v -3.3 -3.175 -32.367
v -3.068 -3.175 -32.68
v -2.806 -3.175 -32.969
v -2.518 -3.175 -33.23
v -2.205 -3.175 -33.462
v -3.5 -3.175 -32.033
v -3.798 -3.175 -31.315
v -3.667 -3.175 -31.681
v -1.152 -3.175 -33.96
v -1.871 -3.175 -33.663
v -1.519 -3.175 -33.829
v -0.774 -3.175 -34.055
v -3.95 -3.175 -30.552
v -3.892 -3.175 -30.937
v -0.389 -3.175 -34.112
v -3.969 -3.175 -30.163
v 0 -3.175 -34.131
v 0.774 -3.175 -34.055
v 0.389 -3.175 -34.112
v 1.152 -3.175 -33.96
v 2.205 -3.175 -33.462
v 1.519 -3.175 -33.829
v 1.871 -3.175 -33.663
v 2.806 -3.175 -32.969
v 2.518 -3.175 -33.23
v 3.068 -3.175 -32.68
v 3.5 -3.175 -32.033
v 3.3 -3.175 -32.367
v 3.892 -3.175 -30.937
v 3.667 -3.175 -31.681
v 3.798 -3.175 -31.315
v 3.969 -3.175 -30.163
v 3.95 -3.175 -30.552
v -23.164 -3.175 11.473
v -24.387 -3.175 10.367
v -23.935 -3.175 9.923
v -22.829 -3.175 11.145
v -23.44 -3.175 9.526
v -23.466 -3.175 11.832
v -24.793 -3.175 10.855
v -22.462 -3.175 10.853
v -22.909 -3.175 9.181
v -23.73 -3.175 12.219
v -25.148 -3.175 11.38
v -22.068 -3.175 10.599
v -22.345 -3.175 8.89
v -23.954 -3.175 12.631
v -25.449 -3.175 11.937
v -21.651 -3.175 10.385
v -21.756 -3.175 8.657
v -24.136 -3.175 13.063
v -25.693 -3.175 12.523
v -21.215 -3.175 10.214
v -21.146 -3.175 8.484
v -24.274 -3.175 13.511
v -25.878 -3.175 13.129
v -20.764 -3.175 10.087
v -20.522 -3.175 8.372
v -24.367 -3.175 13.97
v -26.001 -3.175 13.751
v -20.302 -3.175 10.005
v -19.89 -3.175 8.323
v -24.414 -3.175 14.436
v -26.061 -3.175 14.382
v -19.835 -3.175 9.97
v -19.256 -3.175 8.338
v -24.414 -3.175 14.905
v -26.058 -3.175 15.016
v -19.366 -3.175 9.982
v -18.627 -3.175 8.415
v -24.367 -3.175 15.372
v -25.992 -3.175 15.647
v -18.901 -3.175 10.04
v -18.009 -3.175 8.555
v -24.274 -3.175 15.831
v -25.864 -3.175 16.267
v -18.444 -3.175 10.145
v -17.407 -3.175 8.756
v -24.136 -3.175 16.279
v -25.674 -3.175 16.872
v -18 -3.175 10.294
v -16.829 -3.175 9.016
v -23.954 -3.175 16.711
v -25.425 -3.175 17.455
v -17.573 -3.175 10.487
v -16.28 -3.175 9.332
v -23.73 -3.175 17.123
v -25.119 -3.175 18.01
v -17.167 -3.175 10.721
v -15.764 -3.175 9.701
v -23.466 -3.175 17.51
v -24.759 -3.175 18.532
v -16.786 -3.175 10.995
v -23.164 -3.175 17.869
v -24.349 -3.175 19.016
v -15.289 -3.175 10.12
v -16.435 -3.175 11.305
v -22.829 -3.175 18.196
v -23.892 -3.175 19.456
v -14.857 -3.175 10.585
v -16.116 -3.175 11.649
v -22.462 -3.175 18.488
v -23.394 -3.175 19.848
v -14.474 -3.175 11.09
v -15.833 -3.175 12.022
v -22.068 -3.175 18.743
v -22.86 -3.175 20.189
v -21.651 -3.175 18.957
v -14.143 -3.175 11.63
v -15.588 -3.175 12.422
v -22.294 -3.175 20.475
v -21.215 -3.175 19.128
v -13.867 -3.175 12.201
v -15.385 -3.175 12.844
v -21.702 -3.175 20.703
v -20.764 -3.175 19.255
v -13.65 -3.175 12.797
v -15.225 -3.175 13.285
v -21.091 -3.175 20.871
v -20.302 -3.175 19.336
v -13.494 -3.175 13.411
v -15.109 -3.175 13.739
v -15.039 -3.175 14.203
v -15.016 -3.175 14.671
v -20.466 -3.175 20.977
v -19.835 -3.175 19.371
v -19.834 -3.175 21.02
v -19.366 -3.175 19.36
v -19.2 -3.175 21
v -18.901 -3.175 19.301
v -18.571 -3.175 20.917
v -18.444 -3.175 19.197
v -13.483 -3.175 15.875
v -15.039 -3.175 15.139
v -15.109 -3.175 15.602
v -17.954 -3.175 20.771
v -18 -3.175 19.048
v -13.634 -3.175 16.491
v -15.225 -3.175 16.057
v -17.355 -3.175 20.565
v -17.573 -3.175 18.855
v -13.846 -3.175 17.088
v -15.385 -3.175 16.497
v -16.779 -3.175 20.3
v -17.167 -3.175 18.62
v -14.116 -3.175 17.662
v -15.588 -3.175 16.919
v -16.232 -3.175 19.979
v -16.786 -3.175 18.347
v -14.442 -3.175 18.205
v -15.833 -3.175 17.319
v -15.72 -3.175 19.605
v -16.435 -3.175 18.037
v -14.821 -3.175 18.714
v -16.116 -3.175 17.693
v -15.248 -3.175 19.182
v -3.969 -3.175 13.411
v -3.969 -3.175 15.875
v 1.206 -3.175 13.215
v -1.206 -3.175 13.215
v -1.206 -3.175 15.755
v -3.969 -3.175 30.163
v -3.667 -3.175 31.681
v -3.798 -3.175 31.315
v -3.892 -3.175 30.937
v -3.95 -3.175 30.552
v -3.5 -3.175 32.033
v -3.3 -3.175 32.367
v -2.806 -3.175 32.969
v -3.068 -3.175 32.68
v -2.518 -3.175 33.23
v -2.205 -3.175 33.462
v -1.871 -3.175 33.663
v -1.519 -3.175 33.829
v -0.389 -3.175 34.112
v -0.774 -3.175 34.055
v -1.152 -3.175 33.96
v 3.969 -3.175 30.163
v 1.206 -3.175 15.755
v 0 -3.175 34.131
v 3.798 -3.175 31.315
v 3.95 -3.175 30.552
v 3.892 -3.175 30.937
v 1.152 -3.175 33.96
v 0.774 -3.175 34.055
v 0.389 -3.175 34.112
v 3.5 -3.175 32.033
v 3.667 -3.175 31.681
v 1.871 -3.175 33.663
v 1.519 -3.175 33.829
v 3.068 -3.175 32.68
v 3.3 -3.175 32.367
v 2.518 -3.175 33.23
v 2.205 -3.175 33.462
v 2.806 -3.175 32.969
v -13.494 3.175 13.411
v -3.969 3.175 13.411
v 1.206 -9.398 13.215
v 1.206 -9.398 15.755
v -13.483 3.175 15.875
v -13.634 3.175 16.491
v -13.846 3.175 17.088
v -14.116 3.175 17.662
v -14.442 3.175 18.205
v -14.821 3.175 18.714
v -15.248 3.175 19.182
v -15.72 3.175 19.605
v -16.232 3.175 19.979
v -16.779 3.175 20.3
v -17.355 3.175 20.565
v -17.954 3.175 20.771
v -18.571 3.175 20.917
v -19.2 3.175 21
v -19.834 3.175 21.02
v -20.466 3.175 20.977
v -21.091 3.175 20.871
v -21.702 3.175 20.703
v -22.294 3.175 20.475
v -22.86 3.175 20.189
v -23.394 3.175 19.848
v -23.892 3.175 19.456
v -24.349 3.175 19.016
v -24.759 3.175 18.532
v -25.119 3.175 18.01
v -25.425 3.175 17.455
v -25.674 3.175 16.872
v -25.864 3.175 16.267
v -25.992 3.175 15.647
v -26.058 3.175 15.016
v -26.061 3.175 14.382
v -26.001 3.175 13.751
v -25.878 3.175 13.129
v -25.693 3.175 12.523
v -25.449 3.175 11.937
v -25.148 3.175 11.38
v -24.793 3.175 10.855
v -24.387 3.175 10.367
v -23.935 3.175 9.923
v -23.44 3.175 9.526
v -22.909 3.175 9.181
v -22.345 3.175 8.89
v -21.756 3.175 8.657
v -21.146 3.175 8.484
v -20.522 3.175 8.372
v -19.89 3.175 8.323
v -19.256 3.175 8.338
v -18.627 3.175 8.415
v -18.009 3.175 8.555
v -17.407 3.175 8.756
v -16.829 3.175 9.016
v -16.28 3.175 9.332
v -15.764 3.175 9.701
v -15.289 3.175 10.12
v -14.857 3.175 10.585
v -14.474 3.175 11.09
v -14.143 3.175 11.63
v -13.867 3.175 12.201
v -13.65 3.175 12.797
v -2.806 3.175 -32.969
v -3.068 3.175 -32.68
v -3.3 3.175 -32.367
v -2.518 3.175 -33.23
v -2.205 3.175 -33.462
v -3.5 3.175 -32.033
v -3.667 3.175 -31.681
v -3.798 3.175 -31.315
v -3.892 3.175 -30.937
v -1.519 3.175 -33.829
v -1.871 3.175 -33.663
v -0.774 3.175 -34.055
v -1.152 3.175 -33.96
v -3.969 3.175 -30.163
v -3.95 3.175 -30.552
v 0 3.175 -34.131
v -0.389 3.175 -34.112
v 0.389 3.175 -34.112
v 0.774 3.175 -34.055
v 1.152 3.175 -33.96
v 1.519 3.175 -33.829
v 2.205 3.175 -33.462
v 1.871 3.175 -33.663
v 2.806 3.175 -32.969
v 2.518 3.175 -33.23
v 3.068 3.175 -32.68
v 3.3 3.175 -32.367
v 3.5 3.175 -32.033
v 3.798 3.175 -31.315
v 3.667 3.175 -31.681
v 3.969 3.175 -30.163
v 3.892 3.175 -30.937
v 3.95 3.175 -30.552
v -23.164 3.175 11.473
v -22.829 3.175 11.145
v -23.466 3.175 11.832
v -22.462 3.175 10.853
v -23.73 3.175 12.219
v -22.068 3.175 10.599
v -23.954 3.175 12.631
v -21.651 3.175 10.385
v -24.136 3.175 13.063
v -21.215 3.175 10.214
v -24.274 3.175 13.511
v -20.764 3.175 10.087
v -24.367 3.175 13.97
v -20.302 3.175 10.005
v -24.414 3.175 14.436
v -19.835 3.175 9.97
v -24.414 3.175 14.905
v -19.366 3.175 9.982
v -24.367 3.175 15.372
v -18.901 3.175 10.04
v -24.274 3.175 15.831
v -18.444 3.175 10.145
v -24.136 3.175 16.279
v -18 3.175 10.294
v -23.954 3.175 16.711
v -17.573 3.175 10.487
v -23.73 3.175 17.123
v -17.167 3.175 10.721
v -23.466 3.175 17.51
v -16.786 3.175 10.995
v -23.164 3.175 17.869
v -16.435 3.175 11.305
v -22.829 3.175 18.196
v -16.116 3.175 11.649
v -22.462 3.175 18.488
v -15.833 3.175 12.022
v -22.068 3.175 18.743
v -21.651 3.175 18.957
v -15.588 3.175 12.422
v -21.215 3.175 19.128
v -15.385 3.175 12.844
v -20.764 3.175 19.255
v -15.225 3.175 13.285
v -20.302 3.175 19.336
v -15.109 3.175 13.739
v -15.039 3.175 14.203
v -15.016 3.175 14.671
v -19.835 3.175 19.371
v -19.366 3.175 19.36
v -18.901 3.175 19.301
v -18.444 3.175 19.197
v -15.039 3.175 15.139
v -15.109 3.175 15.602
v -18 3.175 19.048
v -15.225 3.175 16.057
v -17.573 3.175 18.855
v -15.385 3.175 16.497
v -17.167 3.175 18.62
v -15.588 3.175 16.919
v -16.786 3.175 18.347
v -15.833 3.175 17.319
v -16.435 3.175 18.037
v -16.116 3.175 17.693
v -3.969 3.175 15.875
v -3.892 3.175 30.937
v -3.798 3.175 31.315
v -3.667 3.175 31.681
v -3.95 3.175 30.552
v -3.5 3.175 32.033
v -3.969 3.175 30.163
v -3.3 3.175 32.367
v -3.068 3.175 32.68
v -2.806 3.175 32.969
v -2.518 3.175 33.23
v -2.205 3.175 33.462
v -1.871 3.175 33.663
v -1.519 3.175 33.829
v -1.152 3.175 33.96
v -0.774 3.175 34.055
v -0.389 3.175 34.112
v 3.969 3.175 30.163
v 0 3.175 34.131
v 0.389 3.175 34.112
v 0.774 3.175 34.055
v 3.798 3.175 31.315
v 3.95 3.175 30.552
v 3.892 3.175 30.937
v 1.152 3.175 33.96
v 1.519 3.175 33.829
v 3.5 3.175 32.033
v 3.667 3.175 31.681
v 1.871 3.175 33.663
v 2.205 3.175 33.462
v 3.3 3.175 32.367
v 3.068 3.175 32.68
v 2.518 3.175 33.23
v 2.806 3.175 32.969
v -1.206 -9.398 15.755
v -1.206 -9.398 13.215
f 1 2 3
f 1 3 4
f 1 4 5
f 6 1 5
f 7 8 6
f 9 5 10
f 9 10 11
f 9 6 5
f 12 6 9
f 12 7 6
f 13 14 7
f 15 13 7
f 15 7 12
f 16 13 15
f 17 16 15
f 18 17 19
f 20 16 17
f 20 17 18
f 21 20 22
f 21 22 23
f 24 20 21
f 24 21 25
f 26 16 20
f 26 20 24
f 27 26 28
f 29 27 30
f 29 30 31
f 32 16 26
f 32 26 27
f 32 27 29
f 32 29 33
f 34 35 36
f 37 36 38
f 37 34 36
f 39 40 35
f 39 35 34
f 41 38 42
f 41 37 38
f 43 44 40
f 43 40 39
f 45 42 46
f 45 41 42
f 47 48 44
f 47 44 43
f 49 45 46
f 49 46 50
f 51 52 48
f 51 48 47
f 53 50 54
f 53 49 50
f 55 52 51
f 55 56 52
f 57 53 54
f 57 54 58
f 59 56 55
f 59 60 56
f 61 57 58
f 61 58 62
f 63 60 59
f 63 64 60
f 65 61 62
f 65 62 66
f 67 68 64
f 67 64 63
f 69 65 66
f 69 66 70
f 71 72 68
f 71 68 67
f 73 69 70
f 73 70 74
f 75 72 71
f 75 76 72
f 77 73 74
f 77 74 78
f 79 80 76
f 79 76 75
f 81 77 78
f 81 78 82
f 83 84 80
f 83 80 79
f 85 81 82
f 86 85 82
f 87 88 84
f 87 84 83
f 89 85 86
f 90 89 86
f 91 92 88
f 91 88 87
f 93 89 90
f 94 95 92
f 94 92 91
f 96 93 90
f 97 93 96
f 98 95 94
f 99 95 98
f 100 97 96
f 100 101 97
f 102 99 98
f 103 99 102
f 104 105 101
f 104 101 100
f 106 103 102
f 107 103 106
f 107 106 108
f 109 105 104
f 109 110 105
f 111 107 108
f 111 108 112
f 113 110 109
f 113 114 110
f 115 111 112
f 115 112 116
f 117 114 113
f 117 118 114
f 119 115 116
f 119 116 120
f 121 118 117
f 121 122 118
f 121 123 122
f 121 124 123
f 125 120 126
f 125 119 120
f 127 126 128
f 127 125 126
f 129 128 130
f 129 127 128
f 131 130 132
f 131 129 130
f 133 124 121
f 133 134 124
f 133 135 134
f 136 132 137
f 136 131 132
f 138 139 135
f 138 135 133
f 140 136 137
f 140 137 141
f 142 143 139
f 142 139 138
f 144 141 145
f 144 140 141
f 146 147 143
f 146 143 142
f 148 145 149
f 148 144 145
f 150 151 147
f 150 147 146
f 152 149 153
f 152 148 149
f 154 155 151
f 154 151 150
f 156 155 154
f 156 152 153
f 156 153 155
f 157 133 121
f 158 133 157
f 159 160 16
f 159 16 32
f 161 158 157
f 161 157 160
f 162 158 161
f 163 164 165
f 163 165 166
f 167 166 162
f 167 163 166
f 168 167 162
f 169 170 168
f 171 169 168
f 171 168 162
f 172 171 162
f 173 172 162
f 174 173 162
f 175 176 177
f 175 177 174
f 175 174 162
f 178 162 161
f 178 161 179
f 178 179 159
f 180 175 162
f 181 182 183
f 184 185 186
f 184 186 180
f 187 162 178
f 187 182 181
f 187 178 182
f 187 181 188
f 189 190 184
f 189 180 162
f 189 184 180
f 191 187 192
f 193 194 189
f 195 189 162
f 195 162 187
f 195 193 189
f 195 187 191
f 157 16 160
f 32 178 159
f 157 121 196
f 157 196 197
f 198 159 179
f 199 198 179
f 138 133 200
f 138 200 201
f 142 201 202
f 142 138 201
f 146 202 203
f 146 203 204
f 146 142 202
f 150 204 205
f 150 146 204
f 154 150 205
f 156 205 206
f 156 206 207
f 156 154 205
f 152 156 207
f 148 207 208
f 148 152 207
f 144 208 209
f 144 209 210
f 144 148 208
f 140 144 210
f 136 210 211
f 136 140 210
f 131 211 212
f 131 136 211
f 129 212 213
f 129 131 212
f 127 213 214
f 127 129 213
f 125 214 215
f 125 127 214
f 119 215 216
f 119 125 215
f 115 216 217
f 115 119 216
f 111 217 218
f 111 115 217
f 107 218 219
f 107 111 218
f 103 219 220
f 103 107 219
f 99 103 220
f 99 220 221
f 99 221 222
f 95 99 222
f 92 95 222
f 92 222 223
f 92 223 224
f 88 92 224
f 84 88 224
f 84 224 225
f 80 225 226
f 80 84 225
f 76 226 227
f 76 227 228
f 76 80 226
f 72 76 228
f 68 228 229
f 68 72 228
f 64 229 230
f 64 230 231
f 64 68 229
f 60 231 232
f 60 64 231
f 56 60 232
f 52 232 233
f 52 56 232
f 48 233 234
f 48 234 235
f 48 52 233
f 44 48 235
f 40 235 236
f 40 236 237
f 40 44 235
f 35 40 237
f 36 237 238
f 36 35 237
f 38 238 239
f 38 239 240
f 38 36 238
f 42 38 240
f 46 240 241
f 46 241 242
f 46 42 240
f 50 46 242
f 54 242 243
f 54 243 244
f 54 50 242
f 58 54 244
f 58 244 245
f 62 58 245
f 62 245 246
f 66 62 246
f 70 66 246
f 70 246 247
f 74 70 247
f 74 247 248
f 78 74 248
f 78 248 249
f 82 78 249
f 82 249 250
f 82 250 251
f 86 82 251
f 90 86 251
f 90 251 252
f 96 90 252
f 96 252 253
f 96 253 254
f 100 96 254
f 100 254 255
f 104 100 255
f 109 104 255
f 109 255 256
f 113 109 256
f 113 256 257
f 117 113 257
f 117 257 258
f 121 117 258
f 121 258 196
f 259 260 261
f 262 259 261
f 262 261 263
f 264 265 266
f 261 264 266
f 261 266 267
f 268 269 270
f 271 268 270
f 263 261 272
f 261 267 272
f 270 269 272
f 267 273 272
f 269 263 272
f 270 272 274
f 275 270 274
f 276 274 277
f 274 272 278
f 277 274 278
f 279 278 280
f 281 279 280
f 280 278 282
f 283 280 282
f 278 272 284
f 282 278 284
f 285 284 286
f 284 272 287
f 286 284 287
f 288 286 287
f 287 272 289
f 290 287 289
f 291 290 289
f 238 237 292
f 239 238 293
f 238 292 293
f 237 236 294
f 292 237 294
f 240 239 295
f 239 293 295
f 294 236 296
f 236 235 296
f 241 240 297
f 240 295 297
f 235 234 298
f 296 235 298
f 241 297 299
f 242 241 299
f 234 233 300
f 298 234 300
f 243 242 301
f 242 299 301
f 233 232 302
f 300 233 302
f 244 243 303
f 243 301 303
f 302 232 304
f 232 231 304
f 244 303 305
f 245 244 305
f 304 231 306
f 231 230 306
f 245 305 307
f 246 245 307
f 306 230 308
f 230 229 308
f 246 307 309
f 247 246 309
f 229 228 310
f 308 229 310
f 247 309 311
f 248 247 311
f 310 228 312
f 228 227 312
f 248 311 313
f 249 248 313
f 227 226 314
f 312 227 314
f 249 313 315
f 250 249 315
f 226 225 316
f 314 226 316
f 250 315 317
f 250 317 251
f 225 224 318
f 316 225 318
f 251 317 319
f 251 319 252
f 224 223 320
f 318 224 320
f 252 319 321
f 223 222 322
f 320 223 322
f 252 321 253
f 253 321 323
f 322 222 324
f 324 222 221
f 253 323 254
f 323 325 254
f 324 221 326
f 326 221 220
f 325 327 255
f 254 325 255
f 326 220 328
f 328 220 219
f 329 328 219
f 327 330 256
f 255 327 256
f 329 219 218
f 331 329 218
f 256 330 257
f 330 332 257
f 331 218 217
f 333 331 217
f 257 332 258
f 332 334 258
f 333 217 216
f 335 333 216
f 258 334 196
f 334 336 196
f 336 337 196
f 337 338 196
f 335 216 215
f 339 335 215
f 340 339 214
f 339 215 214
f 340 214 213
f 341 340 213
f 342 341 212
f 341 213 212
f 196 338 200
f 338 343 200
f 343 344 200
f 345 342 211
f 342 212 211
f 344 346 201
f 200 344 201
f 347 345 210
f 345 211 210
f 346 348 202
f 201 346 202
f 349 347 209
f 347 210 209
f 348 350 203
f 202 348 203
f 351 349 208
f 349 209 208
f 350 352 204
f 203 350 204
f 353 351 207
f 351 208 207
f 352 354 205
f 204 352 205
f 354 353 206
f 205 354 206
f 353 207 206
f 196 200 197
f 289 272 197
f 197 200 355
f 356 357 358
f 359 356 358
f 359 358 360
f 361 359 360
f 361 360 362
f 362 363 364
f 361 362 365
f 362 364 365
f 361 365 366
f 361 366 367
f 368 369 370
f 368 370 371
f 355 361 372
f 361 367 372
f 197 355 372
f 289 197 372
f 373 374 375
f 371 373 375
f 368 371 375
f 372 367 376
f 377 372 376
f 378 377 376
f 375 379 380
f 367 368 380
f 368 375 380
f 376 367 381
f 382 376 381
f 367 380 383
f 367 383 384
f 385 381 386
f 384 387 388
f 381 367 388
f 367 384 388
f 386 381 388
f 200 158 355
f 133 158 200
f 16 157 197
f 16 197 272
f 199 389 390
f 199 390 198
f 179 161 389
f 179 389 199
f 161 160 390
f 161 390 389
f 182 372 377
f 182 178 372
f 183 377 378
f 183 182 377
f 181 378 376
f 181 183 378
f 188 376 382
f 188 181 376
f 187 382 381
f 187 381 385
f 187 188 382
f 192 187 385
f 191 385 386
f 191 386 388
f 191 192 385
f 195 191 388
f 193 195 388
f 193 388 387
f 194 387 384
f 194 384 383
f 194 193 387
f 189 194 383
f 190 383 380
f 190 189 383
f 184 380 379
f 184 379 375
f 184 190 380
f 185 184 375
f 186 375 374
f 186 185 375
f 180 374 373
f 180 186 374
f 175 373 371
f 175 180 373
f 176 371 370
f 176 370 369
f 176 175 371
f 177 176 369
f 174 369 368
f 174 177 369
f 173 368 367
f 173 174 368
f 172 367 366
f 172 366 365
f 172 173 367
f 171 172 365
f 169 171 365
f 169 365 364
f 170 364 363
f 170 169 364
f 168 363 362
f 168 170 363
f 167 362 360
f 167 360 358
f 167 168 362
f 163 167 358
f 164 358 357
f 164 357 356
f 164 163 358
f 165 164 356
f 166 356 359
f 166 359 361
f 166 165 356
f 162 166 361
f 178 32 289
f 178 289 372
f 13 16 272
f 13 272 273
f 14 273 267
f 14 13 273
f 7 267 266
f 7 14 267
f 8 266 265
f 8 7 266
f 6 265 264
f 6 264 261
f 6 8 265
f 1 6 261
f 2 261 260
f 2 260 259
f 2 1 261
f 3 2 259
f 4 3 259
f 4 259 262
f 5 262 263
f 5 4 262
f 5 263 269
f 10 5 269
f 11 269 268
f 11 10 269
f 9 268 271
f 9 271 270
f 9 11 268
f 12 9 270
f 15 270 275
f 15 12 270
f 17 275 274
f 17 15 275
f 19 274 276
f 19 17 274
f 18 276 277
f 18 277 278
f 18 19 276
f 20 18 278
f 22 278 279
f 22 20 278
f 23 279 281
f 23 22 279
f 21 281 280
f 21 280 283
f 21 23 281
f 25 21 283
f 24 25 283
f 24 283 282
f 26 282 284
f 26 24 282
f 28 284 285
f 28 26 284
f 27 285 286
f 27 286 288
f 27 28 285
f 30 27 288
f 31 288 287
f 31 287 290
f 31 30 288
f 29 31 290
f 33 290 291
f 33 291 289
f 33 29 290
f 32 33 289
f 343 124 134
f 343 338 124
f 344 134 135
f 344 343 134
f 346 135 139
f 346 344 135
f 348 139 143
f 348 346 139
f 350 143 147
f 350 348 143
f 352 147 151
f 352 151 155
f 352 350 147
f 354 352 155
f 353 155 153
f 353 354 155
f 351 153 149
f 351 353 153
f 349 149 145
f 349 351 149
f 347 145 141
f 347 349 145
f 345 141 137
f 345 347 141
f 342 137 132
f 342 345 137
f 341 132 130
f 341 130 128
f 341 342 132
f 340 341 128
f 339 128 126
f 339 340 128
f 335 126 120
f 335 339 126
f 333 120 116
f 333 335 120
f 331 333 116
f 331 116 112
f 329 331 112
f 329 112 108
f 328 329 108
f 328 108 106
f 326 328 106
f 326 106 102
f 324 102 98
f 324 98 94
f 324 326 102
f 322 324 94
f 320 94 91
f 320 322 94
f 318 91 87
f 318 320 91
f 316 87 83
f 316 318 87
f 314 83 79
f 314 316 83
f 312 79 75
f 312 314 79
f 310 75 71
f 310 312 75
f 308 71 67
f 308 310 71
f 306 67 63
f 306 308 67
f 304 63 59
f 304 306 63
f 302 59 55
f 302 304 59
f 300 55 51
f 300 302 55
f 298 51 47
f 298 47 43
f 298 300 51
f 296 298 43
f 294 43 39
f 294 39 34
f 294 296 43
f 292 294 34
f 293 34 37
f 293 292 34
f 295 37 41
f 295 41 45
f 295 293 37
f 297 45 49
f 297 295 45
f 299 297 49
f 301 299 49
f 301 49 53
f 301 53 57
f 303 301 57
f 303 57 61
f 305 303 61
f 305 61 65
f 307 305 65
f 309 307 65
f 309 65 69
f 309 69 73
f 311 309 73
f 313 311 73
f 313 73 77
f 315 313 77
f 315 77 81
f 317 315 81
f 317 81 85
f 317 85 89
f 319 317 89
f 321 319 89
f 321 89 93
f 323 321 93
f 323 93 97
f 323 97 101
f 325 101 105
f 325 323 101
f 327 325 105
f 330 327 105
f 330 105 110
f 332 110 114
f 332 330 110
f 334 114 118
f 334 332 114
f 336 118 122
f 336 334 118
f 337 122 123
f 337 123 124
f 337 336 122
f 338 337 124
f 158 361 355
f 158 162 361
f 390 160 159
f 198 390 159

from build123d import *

# Parameters (mm, degrees)
F0_W     = 2.413
F0_H     = 2.54
F0_R     = 4.7018325436
F1_DEPTH = 3.175
F2_DEPTH = 9.398
F3_DEPTH = 3.175


with BuildPart() as f1:
    # F0 (on Front) → F1 (new body, symmetric)
    with BuildSketch(Plane.XZ):
        Polygon((3.96875, -30.1625), (3.96875, 30.1625), (-3.96875, 30.1625), (-3.96875, 15.875), (-3.96875, 13.4112), (-3.96875, -30.1625), align=None)
        with Locations((0, 14.4846439362)):
            Rectangle(F0_W, F0_H, mode=Mode.SUBTRACT)
        with BuildLine():
            Line((-3.96875, 30.1625), (3.96875, 30.1625))
            ThreePointArc((3.96875, 30.1625), (0, 34.13125), (-3.96875, 30.1625))
        make_face()
        with BuildLine():
            ThreePointArc((-3.96875, -30.1625), (0, -34.13125), (3.96875, -30.1625))
            Line((3.96875, -30.1625), (-3.96875, -30.1625))
        make_face()
        with BuildLine():
            Line((-13.49375, 15.875), (-13.4827836254, 15.875))
            ThreePointArc((-13.4827836254, 15.875), (-26.0674995034, 14.699090169), (-13.49375, 13.4112))
            Line((-13.49375, 13.4112), (-13.49375, 15.875))
        make_face()
        with Locations((-19.7175624037, 14.6708265968)):
            Circle(F0_R, mode=Mode.SUBTRACT)
        with BuildLine():
            ThreePointArc((-13.3675624037, 14.6708265968), (-13.3964333415, 15.2756632514), (-13.4827836254, 15.875))
            Line((-13.4827836254, 15.875), (-13.49375, 15.875))
            Line((-13.49375, 15.875), (-13.49375, 13.4112))
            ThreePointArc((-13.49375, 13.4112), (-13.3991880573, 14.0378608645), (-13.3675624037, 14.6708265968))
        make_face()
        with BuildLine():
            Line((-3.96875, 13.4112), (-3.96875, 15.875))
            Line((-3.96875, 15.875), (-13.4827836254, 15.875))
            ThreePointArc((-13.4827836254, 15.875), (-13.3964333415, 15.2756632514), (-13.3675624037, 14.6708265968))
            ThreePointArc((-13.3675624037, 14.6708265968), (-13.3991880573, 14.0378608645), (-13.49375, 13.4112))
            Line((-13.49375, 13.4112), (-3.96875, 13.4112))
        make_face()
    extrude(amount=F1_DEPTH, both=True)

    # F0 (on Front) → F2 (join)
    with BuildSketch(Plane.XZ):
        with Locations((0, 14.4846439362)):
            Rectangle(F0_W, F0_H)
    extrude(amount=F2_DEPTH)

    # F0 (on Front) → F3 (join)
    with BuildSketch(Plane.XZ):
        with Locations((0, 14.4846439362)):
            Rectangle(F0_W, F0_H)
    extrude(amount=-F3_DEPTH)


solid = f1.part
